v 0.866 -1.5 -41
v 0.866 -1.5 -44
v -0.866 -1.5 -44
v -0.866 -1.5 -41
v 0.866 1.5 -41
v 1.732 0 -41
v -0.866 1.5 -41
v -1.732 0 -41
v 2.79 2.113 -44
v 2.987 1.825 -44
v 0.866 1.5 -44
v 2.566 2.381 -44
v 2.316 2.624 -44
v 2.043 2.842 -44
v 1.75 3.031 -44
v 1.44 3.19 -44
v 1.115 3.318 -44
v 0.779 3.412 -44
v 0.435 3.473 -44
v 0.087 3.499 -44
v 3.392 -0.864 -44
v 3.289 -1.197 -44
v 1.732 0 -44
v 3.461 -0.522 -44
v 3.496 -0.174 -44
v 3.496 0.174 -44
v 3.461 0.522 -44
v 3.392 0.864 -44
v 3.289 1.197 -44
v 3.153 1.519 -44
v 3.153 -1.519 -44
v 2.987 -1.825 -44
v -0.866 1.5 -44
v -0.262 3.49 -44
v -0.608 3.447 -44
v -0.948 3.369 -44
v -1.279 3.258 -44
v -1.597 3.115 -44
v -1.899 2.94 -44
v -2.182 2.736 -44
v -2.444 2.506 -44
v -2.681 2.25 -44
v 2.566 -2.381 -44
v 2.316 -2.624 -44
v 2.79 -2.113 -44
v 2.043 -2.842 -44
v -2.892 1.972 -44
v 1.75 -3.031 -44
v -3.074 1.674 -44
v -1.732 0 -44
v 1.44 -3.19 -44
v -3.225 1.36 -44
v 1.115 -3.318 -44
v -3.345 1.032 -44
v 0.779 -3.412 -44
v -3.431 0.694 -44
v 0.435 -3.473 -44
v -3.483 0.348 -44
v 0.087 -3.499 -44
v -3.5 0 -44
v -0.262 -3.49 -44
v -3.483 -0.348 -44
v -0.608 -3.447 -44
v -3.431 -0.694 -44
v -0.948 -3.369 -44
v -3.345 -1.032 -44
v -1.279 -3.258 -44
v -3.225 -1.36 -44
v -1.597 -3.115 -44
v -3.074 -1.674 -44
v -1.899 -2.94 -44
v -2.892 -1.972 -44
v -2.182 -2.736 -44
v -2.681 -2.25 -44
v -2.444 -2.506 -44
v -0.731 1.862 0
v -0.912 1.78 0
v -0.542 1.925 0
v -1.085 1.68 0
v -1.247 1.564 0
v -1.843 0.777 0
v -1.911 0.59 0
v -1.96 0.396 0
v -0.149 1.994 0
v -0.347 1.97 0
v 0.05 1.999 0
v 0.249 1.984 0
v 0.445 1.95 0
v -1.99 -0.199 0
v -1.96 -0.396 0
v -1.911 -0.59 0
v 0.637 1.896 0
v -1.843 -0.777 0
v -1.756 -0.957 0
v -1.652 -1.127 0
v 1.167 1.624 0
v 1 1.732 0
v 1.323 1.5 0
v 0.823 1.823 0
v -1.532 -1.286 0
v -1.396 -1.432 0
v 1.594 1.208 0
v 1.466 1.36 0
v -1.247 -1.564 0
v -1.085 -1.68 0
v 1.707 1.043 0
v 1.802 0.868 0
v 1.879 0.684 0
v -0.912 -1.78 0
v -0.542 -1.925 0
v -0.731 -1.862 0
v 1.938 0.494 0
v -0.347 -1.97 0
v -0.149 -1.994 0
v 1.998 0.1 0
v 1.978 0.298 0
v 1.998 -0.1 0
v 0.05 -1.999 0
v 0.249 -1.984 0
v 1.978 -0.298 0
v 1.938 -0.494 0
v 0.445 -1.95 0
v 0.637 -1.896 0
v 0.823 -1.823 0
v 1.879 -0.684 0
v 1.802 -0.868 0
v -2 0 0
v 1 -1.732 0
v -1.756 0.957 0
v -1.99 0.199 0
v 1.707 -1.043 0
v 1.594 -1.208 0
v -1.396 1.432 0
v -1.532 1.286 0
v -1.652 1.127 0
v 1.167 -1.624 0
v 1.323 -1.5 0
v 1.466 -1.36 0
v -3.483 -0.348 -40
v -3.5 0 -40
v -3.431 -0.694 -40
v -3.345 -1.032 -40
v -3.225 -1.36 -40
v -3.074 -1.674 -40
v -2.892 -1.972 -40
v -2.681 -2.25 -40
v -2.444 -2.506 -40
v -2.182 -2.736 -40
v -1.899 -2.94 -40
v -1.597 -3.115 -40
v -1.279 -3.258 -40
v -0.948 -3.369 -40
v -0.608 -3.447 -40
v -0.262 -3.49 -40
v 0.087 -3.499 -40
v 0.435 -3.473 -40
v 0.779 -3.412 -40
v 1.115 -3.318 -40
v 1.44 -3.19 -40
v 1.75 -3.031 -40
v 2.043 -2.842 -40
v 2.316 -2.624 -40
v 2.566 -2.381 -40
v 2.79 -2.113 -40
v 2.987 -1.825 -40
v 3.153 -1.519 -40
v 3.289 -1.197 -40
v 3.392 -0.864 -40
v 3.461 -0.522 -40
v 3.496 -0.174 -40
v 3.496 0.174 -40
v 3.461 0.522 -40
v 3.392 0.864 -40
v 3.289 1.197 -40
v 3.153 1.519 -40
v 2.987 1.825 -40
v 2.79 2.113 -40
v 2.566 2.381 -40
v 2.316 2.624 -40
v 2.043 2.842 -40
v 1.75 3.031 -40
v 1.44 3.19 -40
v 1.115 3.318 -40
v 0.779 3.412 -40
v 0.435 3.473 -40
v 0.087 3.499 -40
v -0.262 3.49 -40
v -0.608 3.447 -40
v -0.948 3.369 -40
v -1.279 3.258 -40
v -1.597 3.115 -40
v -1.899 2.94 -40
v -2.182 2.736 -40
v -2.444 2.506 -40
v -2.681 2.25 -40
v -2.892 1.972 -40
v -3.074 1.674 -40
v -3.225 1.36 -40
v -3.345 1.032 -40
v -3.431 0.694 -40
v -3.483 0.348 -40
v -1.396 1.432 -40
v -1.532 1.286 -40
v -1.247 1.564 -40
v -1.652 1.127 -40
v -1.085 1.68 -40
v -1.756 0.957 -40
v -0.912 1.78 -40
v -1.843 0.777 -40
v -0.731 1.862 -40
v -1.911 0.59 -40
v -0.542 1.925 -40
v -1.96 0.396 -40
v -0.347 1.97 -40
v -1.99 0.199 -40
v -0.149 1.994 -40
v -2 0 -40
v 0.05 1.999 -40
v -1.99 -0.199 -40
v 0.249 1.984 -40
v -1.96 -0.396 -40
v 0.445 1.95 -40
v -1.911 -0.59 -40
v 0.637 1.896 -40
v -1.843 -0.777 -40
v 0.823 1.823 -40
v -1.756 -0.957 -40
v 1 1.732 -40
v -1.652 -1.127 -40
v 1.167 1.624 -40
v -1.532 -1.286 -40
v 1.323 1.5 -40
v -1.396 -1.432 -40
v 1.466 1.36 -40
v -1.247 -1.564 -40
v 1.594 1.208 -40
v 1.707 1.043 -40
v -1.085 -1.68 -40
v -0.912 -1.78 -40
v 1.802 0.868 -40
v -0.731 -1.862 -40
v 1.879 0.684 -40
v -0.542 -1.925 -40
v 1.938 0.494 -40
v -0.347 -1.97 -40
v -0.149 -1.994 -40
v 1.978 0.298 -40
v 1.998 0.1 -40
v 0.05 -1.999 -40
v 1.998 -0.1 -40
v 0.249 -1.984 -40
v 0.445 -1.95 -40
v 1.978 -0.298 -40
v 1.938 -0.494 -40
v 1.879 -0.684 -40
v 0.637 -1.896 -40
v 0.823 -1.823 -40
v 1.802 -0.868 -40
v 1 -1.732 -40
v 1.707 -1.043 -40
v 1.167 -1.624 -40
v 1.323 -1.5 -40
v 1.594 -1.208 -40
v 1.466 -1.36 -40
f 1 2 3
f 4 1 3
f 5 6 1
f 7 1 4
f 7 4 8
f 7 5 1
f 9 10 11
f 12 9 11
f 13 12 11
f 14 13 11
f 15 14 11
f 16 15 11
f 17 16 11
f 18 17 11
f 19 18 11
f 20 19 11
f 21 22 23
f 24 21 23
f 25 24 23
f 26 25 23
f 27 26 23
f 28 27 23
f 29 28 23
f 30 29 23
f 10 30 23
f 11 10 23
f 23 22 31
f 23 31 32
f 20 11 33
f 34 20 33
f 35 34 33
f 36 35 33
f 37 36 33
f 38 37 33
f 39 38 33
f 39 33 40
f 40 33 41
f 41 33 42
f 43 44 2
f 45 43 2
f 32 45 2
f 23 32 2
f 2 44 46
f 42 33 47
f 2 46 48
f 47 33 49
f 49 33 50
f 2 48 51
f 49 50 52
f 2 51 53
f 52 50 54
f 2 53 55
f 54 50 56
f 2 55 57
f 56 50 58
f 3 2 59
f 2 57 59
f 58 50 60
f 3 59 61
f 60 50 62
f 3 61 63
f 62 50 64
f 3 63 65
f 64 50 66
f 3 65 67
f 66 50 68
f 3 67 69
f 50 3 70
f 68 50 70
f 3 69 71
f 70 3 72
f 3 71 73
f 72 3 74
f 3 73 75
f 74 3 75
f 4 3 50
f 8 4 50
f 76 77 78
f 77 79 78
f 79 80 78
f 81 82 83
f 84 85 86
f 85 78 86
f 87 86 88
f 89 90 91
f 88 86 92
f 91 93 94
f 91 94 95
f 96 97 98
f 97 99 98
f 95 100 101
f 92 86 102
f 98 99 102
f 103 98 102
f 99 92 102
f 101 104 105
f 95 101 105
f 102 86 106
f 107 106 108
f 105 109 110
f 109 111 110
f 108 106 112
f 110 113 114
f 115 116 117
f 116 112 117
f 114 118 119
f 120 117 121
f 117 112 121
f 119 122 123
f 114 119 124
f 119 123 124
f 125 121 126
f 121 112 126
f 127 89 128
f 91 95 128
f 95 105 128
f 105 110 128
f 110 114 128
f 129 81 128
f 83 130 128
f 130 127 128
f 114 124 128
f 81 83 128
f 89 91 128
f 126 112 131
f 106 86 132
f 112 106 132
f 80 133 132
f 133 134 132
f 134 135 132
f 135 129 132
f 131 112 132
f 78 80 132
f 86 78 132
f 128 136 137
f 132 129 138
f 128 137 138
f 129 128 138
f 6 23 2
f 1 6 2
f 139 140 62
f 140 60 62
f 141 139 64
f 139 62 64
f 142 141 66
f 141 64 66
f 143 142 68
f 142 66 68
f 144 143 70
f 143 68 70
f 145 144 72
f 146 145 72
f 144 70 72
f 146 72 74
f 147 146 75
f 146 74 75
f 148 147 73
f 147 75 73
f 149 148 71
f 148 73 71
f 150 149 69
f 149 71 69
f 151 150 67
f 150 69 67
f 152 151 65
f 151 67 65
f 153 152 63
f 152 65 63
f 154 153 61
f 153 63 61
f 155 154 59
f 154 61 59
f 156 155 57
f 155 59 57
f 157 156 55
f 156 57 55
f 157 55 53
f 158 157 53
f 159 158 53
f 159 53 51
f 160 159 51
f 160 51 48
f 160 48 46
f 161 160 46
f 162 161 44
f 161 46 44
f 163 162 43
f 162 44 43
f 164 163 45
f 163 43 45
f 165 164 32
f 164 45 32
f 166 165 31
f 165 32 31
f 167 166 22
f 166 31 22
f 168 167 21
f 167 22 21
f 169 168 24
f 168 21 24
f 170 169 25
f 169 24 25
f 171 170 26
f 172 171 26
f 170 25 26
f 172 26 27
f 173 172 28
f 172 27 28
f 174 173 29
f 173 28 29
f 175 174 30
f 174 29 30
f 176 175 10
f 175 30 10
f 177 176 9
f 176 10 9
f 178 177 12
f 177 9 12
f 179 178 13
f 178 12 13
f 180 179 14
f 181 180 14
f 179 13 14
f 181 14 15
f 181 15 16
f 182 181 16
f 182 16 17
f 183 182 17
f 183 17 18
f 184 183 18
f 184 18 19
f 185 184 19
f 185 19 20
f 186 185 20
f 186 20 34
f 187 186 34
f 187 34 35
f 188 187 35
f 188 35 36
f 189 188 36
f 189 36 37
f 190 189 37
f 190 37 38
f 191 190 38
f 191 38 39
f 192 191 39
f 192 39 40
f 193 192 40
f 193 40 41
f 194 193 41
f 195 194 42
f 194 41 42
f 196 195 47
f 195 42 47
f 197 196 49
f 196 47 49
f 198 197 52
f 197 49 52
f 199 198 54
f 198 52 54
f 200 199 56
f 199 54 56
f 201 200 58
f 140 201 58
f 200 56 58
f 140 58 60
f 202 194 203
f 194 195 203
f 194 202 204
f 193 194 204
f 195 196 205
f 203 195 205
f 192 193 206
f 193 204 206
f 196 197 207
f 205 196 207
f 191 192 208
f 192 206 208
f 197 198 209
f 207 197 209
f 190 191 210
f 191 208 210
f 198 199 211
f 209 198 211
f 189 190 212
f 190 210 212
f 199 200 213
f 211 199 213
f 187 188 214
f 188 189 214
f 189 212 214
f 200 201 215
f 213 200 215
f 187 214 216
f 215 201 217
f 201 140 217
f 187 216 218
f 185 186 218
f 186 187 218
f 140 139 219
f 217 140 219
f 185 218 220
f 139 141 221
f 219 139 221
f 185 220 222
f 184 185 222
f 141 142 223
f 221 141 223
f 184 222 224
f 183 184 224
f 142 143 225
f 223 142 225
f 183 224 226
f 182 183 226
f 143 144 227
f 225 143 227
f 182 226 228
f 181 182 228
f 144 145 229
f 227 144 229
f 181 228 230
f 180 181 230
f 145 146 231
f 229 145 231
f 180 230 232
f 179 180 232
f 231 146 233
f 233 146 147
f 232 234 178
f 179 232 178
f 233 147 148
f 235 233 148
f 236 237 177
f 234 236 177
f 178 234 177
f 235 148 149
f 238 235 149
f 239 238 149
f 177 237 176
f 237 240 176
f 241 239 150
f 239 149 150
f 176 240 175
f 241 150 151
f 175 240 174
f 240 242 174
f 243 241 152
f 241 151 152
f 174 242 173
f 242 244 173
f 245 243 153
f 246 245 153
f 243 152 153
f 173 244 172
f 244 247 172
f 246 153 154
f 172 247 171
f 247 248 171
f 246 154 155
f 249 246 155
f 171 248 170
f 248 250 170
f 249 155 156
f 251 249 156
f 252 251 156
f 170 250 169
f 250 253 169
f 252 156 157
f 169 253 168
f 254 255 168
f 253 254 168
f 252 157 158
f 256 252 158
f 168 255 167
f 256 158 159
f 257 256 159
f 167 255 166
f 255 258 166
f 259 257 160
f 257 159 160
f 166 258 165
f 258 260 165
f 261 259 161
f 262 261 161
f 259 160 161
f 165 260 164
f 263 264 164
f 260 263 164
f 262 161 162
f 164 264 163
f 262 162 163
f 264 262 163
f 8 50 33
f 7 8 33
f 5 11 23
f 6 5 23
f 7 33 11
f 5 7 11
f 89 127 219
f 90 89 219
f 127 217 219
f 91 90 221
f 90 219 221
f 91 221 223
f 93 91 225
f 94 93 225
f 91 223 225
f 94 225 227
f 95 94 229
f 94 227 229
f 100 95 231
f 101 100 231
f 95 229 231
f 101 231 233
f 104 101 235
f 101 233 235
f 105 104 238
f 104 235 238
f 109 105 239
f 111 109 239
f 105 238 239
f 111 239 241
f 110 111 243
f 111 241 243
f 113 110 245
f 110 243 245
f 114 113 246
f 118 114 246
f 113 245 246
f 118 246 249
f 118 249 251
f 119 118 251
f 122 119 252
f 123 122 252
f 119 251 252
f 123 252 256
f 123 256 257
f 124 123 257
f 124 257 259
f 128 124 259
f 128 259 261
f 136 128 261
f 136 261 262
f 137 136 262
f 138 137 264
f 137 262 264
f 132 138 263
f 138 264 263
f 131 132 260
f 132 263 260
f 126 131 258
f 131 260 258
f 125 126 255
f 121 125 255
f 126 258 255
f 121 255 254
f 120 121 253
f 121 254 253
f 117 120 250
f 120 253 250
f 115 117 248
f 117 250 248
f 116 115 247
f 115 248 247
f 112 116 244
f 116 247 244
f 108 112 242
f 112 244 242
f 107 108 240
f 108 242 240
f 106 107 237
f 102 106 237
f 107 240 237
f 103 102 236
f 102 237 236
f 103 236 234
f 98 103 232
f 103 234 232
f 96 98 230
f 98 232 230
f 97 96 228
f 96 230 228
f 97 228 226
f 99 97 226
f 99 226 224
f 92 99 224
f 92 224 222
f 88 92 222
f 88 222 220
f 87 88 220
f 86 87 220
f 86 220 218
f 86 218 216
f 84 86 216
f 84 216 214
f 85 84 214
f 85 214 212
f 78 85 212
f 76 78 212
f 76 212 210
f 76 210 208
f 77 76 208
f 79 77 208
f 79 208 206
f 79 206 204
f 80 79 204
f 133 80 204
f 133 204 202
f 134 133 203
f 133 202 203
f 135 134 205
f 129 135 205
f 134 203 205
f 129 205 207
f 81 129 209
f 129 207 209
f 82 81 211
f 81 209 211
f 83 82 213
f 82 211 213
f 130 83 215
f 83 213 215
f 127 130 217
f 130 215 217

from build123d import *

# Parameters (mm, degrees)
CUT_EXTRUDE1_DEPTH = 3


with BuildPart() as part:
    # Sketch1 → Revolve1 (revolve)
    with BuildSketch(Plane(origin=(0, 0, 0), x_dir=(1, 0, 0), z_dir=(0, 1, 0)), mode=Mode.PRIVATE) as revolve1_sk:
        Polygon((0, 0), (2, 0), (2, 40), (3.5, 40), (3.5, 44), (0, 44), align=None)
    revolve(revolve1_sk.sketch.rotate(Axis((0, 0, -44), (0, 0, 1)), 180), axis=Axis((0, 0, -44), (0, 0, 1)))

    # Sketch2 → Cut-Extrude1 (cut)
    with BuildSketch(Plane(origin=(0, 0, -44), x_dir=(-1, 0, 0), z_dir=(0, 0, -1))):
        Polygon((-0.866025404, -1.5), (0.866025404, -1.5), (1.732050808, 0), (0.866025404, 1.5), (-0.866025404, 1.5), (-1.732050808, 0), align=None)
    extrude(amount=-CUT_EXTRUDE1_DEPTH, mode=Mode.SUBTRACT)


solid = part.part
